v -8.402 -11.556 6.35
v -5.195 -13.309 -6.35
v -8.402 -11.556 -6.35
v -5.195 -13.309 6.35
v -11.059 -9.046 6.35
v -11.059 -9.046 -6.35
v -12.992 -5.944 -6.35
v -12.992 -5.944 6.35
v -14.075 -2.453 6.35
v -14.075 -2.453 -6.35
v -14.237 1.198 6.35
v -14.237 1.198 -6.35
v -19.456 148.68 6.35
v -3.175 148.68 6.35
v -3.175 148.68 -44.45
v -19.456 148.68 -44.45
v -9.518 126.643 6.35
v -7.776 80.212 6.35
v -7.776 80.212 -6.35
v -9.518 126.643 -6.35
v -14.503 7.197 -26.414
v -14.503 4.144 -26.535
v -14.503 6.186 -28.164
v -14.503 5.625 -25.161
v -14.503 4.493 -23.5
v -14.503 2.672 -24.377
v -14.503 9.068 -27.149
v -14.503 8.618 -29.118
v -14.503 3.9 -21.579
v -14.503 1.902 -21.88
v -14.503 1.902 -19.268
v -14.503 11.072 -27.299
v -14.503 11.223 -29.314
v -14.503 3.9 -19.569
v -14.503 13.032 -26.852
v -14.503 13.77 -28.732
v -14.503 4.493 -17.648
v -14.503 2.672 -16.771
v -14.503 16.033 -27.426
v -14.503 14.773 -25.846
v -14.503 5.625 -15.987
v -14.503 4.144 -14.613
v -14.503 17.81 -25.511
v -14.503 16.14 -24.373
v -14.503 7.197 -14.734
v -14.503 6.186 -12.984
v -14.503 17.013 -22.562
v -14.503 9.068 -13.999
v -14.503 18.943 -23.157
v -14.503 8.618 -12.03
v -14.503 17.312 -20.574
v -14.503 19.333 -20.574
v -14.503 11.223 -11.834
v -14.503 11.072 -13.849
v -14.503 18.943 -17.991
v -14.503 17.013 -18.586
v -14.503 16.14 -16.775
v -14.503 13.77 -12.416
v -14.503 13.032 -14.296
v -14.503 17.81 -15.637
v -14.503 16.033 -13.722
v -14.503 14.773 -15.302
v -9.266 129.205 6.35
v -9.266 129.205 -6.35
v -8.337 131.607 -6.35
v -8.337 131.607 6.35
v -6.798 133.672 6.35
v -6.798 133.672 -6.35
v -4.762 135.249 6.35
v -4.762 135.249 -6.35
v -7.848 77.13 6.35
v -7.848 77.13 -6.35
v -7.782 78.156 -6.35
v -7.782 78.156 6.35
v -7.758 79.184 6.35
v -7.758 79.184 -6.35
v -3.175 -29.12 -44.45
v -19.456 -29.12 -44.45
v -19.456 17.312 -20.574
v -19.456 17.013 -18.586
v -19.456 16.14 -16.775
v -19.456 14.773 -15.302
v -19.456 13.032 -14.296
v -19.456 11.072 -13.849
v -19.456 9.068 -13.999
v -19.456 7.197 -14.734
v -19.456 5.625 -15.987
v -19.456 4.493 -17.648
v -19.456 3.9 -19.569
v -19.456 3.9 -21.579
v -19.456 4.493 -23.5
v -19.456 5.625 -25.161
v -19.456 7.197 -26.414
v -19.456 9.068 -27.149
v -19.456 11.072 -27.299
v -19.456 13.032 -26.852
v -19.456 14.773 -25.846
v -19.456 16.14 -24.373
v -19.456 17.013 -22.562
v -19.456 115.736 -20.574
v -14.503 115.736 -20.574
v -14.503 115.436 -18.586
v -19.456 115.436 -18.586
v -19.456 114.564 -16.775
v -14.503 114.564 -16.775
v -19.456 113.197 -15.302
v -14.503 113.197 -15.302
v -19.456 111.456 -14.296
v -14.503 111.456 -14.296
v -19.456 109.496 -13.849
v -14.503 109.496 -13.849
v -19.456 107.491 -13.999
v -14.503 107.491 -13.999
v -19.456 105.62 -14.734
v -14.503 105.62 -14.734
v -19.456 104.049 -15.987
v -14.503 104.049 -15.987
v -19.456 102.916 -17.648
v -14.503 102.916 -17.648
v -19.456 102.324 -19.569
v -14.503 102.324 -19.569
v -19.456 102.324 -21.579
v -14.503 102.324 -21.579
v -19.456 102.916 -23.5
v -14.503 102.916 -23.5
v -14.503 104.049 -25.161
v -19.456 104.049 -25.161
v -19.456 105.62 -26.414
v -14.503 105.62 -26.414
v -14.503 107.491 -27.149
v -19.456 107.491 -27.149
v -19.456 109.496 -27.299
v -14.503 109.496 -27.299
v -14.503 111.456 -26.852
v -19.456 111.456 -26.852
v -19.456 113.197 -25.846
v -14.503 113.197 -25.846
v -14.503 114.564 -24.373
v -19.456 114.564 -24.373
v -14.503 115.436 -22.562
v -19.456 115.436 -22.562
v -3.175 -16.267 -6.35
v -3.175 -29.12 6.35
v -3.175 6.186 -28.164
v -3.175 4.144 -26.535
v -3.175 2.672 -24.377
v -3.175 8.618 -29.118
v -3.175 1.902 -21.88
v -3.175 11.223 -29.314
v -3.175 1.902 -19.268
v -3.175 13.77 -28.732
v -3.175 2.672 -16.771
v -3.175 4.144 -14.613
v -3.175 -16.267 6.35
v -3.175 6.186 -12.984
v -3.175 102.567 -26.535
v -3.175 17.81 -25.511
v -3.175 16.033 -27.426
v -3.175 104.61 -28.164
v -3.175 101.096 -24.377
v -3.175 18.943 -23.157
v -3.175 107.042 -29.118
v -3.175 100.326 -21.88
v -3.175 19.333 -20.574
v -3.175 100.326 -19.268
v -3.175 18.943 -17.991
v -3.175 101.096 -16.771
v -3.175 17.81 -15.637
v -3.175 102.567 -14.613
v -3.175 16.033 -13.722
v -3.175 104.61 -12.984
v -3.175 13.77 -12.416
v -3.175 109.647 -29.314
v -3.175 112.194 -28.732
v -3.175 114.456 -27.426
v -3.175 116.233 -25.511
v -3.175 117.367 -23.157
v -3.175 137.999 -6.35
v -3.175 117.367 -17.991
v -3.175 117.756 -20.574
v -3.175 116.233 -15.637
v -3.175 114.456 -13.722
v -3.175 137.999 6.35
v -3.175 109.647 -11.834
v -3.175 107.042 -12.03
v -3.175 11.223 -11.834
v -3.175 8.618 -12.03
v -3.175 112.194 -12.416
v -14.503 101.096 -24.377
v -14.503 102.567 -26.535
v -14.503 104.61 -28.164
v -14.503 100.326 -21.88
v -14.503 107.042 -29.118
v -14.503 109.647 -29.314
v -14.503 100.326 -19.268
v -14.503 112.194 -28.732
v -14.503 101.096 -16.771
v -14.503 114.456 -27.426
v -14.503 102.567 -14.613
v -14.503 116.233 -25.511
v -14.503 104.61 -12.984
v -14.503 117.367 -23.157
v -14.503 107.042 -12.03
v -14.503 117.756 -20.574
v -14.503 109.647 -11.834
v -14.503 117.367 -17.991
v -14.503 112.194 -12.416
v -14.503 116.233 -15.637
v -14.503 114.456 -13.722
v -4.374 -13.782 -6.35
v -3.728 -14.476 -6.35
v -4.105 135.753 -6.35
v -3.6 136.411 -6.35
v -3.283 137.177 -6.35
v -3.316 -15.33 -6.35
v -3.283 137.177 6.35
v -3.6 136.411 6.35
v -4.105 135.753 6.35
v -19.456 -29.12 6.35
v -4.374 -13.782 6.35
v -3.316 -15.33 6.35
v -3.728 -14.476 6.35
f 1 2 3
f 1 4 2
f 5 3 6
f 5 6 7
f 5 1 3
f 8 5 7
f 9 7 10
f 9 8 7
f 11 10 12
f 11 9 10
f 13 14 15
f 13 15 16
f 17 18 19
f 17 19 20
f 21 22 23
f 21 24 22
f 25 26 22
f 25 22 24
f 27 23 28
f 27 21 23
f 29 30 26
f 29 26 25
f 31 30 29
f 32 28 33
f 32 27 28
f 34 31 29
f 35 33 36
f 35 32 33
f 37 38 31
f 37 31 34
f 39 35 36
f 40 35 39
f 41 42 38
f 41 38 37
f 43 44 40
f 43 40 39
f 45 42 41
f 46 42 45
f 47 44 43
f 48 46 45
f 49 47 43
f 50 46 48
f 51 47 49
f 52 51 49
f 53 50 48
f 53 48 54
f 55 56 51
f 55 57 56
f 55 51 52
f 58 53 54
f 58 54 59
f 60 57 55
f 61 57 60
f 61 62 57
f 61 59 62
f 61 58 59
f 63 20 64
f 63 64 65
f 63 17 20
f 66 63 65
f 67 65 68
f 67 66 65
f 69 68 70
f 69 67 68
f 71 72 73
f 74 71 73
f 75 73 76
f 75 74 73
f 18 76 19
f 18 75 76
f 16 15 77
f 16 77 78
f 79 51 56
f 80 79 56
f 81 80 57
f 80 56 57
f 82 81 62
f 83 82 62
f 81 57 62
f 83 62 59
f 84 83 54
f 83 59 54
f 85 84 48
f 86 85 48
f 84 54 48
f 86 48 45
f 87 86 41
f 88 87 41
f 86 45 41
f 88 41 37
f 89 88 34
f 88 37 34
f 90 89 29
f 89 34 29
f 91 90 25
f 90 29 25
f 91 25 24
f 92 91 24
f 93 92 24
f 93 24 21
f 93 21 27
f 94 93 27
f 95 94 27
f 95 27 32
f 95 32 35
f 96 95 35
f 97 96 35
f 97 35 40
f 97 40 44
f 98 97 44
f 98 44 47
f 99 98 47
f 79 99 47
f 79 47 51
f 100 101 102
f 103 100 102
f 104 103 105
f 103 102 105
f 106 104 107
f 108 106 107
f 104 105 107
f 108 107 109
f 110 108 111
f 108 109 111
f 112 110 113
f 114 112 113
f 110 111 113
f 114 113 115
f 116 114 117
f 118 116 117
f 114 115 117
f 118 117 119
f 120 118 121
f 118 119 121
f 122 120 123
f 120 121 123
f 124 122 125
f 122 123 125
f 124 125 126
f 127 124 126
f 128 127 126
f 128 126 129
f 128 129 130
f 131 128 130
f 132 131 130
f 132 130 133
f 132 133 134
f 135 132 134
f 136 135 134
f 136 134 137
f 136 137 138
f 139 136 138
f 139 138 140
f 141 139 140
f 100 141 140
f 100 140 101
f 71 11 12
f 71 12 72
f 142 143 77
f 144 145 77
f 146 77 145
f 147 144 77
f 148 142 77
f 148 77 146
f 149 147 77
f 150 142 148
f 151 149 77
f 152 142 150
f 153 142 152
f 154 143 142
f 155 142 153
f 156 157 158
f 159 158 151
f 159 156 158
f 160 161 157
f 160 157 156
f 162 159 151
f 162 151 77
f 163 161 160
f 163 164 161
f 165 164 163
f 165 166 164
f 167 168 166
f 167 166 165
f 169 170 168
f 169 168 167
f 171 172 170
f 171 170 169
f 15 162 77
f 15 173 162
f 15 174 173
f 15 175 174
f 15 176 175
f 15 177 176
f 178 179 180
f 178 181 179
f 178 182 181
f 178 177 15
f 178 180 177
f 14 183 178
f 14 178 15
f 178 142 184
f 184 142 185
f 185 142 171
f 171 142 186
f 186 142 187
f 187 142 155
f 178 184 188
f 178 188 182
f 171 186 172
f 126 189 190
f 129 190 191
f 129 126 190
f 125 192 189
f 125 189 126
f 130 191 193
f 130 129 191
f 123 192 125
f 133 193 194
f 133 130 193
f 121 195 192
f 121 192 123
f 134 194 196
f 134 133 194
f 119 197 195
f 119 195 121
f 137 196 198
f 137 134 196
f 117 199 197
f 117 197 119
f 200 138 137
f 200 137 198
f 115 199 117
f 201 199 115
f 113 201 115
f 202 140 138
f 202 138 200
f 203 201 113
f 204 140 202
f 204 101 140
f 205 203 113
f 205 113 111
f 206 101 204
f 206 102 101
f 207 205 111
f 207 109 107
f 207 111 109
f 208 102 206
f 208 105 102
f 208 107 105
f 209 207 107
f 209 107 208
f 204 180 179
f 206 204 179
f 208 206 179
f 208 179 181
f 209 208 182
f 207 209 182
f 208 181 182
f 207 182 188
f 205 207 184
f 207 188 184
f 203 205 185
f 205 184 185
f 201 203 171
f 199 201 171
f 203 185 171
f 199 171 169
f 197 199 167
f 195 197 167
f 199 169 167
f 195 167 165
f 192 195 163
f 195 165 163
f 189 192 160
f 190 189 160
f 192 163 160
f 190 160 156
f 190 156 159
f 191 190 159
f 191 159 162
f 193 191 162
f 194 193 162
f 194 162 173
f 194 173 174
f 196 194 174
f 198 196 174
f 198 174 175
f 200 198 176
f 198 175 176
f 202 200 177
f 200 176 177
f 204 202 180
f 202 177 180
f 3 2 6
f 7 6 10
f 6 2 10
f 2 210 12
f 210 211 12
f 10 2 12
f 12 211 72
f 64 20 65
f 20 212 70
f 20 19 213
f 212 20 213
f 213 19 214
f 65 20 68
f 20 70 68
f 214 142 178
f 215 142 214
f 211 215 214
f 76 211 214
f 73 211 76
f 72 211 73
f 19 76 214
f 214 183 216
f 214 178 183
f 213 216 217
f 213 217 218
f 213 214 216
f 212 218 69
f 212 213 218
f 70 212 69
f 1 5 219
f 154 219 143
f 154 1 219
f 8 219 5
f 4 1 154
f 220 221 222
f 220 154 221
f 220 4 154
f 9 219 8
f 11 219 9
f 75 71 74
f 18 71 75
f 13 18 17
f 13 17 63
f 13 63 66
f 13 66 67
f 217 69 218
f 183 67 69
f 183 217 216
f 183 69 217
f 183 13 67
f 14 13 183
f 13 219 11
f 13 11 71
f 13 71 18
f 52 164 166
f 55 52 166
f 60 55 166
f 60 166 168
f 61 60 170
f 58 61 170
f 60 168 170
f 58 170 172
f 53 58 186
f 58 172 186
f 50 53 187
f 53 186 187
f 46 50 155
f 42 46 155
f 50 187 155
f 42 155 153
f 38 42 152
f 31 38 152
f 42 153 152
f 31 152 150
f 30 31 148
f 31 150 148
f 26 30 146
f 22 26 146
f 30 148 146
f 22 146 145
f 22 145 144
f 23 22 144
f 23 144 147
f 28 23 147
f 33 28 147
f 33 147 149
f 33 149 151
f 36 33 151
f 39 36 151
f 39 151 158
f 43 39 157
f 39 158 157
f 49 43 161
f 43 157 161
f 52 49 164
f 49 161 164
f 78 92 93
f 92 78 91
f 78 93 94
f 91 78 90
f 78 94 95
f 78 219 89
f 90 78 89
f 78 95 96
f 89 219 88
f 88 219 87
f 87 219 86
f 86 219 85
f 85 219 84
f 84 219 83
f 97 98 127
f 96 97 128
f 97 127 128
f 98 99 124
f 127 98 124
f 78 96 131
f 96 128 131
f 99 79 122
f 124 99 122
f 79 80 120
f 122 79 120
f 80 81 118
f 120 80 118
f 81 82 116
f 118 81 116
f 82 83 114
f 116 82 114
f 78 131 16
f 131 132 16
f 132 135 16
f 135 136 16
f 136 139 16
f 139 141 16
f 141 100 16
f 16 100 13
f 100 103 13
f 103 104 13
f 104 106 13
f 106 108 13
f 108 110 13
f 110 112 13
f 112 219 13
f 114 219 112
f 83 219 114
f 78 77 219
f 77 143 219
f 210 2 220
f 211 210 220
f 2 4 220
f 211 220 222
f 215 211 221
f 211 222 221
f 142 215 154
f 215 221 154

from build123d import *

# Parameters (mm, degrees)
BOSS_EXTRUDE1_DEPTH = 6.35
FILLET1_R           = 3.175
SKETCH3_W           = 16.2814
SKETCH3_H           = 177.8
BOSS_EXTRUDE2_DEPTH = 38.1
SKETCH4_R           = 6.7437
CUT_EXTRUDE1_DEPTH  = 157.034307273
SKETCH5_R           = 8.7641176
CUT_EXTRUDE2_DEPTH  = 11.3284


with BuildPart() as part:
    # Sketch1 → Boss-Extrude1 (new, symmetric)
    with BuildSketch(Plane.XY):
        with BuildLine():
            Line((-3.175, 148.680256121), (-19.4564, 148.680256121))
            Line((-19.4564, 148.680256121), (-19.4564, -29.119743879))
            Line((-19.4564, -29.119743879), (-3.175, -29.119743879))
            Line((-3.175, -29.119743879), (-3.175, -13.930255965))
            ThreePointArc((-3.175, -13.930255965), (-11.533104962, -8.433276125), (-14.237180291, 1.198062439))
            Line((-14.237180291, 1.198062439), (-7.84751395, 77.129690658))
            ThreePointArc((-7.84751395, 77.129690658), (-7.764904905, 78.669797764), (-7.775922348, 80.212079439))
            Line((-7.775922348, 80.212079439), (-9.518300378, 126.6428125))
            ThreePointArc((-9.518300378, 126.6428125), (-7.878891544, 132.352447387), (-3.175, 135.980256121))
            Line((-3.175, 135.980256121), (-3.175, 148.680256121))
        make_face()
    extrude(amount=BOSS_EXTRUDE1_DEPTH, both=True)

    # Fillet1
    fillet1_edges = [part.edges().sort_by_distance(p)[0] for p in [
        (-3.175, 135.980256121, 0),
        (-3.175, -13.930255965, 0),
    ]]
    fillet(fillet1_edges, radius=FILLET1_R)

    # Sketch3 → Boss-Extrude2 (add)
    with BuildSketch(Plane(origin=(0, 0, -6.35), x_dir=(-1, 0, 0), z_dir=(0, 0, -1))):
        with Locations((11.3157, 59.780256121)):
            Rectangle(SKETCH3_W, SKETCH3_H)
    extrude(amount=BOSS_EXTRUDE2_DEPTH)

    # Sketch4 → Cut-Extrude1 (cut, through all)
    with BuildSketch(Plane(origin=(-3.175, 0, 0), x_dir=(0, 0, -1), z_dir=(1, 0, 0))):
        with Locations(Location((20.574, 108.991994121, 0), (0, 0, 90))):
            Circle(SKETCH4_R)
        with Locations(Location((20.574, 10.568518121, 0), (0, 0, 90))):
            Circle(SKETCH4_R)
    extrude(amount=-CUT_EXTRUDE1_DEPTH, mode=Mode.SUBTRACT)

    # Sketch5 → Cut-Extrude2 (cut)
    with BuildSketch(Plane(origin=(-3.175, 0, 0), x_dir=(0, 0, -1), z_dir=(1, 0, 0))):
        with Locations(Location((20.574, 108.991994121, 0), (0, 0, 90))):
            Circle(SKETCH5_R)
        with Locations(Location((20.574, 10.568518121, 0), (0, 0, 90))):
            Circle(SKETCH5_R)
    extrude(amount=-CUT_EXTRUDE2_DEPTH, mode=Mode.SUBTRACT)


solid = part.part
